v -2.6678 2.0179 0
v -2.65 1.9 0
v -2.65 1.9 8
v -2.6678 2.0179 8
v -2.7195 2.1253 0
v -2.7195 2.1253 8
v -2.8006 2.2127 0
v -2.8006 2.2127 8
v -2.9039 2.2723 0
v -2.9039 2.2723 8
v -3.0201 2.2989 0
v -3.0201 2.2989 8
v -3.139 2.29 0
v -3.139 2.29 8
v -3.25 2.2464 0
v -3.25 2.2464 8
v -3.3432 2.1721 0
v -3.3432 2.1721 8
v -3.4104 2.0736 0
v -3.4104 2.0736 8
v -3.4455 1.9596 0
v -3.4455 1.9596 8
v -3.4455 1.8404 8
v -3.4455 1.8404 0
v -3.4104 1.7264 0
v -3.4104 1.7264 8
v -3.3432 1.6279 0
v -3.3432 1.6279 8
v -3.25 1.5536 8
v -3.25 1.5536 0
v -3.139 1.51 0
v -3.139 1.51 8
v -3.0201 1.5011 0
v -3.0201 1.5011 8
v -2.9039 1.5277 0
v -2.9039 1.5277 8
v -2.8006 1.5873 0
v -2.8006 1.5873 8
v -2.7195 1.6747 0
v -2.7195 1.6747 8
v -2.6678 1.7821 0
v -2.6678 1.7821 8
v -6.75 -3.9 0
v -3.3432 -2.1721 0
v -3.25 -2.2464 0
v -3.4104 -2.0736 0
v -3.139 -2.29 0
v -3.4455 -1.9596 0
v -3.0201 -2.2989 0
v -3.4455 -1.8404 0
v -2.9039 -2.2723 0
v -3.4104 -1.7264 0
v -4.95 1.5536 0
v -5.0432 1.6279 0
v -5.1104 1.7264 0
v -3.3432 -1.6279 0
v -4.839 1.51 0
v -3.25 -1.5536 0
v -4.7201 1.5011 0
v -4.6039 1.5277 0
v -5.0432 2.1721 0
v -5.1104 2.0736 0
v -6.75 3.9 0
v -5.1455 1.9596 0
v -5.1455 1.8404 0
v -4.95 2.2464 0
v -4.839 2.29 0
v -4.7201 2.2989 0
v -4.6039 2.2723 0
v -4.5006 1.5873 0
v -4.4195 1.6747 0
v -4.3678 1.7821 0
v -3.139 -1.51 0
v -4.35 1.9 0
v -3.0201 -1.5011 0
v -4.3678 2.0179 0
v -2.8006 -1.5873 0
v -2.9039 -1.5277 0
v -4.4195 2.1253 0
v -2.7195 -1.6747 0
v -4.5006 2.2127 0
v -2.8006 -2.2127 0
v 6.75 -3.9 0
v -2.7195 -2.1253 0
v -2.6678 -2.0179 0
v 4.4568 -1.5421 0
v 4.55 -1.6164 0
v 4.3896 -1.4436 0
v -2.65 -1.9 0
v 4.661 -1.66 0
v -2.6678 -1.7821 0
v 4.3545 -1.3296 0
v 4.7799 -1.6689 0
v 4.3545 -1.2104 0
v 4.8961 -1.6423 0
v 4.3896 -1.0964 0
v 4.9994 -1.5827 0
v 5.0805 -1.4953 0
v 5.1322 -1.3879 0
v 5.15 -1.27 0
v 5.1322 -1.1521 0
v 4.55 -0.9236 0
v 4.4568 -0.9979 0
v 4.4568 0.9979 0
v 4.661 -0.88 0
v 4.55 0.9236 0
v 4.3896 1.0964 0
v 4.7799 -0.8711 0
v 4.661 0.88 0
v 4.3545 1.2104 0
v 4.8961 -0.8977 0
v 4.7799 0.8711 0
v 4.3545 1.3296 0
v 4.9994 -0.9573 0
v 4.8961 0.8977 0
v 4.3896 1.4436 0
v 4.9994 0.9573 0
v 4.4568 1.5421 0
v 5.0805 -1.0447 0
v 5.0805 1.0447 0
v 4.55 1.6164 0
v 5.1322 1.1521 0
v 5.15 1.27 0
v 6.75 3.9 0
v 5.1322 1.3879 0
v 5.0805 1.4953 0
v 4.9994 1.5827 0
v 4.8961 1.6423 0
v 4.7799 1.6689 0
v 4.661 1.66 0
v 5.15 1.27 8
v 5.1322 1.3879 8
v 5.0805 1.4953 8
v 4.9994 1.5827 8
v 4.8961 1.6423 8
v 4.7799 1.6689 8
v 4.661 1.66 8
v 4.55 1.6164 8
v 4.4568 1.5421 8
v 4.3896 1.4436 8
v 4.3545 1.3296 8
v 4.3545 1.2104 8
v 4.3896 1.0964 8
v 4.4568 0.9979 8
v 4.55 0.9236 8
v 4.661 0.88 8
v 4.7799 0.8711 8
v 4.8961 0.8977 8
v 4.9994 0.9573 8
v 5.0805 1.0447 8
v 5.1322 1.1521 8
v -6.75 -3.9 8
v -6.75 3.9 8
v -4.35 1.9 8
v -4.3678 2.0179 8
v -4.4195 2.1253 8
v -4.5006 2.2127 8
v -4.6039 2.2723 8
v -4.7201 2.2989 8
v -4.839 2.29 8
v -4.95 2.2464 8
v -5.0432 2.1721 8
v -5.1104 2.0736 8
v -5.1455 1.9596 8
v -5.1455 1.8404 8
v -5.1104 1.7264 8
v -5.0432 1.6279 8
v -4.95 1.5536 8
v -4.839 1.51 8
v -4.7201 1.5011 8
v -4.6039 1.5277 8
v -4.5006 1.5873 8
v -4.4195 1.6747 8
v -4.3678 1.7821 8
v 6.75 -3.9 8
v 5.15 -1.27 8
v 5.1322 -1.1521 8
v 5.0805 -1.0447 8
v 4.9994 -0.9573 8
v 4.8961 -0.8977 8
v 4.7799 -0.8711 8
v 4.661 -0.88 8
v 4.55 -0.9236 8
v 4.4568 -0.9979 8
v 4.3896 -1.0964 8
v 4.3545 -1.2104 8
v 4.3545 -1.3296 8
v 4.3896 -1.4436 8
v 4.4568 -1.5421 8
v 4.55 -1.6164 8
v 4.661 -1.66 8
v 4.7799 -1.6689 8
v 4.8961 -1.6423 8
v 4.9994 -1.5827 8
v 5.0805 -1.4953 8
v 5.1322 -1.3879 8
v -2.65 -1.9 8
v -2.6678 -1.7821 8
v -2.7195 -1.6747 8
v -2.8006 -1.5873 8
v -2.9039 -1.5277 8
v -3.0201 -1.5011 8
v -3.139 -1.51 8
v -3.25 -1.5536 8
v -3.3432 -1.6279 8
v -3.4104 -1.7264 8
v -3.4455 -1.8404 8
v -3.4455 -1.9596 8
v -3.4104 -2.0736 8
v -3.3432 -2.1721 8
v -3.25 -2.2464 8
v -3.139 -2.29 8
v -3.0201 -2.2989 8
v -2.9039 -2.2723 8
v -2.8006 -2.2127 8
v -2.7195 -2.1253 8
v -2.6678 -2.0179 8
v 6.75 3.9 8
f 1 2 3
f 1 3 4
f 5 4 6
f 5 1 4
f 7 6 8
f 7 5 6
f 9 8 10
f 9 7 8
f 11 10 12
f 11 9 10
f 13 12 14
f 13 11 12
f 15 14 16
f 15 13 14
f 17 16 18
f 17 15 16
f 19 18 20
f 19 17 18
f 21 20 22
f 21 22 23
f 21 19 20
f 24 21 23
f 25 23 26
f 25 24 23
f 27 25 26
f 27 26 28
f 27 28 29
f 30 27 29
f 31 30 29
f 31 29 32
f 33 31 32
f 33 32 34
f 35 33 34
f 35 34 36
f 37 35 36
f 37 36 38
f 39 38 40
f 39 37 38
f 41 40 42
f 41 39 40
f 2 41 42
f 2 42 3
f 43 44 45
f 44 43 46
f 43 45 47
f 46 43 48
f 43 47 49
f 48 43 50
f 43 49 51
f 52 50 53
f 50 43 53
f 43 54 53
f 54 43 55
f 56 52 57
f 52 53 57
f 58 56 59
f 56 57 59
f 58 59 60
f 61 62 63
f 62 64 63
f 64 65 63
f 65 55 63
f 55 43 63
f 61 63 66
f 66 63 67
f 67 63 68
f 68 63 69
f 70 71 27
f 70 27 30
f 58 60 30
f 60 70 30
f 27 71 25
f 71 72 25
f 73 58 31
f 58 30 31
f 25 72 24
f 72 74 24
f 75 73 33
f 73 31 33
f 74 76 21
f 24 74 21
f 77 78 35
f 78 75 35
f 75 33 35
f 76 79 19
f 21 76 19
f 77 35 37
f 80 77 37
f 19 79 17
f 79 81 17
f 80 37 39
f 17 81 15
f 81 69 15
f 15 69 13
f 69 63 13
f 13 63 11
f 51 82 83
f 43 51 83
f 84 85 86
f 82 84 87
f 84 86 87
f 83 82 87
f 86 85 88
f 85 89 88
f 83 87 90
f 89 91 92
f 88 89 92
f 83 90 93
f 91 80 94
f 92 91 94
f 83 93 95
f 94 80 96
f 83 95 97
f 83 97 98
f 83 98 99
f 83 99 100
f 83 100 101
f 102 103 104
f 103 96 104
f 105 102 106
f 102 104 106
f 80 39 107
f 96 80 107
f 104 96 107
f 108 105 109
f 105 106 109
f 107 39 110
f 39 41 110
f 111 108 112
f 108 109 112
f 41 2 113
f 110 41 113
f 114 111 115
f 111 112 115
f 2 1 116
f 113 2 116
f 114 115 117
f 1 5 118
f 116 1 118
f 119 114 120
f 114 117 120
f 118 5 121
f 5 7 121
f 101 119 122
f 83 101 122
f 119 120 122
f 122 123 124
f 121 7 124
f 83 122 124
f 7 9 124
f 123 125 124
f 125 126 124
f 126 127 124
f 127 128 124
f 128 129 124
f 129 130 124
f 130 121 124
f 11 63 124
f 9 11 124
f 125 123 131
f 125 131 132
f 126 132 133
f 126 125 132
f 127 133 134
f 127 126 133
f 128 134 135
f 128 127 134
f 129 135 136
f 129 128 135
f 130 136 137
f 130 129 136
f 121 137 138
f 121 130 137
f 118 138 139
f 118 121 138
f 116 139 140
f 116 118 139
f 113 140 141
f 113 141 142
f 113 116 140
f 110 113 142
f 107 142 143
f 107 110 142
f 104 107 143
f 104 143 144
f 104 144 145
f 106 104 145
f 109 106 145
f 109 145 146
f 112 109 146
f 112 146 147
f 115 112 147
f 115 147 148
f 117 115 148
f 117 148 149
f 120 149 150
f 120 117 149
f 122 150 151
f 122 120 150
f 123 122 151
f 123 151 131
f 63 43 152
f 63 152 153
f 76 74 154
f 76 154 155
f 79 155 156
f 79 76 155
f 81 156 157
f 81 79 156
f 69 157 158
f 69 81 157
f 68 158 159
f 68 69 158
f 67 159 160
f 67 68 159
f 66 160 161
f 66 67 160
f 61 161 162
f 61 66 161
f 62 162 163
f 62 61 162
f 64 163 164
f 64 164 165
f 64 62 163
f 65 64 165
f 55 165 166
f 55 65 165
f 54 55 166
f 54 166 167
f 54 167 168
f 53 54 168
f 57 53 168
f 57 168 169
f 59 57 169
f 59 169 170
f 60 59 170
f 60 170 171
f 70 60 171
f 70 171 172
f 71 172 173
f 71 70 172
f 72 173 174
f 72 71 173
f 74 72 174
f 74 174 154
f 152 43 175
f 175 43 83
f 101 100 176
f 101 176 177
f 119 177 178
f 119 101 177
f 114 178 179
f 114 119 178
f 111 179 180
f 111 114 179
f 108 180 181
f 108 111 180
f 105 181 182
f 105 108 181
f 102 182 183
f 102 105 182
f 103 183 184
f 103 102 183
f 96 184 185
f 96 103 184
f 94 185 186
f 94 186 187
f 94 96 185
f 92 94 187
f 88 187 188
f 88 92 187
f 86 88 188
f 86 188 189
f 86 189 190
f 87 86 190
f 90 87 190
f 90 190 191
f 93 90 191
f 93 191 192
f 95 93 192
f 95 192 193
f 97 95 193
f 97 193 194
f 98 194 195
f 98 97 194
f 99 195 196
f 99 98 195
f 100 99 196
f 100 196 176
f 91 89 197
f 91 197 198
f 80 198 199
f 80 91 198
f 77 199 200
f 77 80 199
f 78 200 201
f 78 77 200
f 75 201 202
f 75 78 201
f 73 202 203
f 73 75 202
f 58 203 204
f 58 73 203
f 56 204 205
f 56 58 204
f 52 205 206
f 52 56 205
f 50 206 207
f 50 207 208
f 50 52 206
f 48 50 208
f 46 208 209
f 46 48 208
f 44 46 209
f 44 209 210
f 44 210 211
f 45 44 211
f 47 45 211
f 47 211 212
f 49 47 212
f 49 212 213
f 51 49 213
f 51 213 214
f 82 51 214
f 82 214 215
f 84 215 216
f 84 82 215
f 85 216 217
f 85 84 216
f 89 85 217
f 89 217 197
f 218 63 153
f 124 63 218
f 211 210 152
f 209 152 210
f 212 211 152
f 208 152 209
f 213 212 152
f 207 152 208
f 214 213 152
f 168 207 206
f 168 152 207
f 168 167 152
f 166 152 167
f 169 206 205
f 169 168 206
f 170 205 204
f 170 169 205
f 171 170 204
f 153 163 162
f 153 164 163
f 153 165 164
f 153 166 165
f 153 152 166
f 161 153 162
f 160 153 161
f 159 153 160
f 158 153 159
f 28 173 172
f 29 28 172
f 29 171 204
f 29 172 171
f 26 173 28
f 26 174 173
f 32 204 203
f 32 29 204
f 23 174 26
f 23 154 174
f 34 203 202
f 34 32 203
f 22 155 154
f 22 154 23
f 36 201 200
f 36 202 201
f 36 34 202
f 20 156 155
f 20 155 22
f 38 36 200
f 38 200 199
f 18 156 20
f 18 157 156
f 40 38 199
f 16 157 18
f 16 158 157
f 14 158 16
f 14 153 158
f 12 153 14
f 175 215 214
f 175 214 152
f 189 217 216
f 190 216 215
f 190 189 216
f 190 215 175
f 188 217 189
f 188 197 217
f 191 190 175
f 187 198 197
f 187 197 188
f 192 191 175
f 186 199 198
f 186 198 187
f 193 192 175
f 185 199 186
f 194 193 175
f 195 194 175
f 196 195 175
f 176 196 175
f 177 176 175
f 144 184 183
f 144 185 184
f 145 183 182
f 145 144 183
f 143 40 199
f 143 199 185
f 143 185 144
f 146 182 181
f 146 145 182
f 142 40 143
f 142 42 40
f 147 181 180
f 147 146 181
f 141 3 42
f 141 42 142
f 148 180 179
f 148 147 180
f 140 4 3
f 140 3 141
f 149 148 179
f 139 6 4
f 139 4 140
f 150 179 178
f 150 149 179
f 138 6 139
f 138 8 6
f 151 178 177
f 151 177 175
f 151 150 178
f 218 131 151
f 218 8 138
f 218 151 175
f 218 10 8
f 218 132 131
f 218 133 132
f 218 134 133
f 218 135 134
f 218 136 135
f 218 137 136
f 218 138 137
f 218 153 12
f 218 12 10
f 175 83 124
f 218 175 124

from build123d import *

# Parameters (mm, degrees)
F0_W     = 13.5
F0_H     = 7.8
F0_R     = 0.4
F1_DEPTH = 8


with BuildPart() as f1:
    # F0 (on Top) → F1 (new body)
    with BuildSketch(Plane.XY):
        Rectangle(F0_W, F0_H)
        with Locations((-3.05, -1.9)):
            Circle(F0_R, mode=Mode.SUBTRACT)
        with Locations((4.75, -1.27)):
            Circle(F0_R, mode=Mode.SUBTRACT)
        with Locations((-4.75, 1.9)):
            Circle(F0_R, mode=Mode.SUBTRACT)
        with Locations((-3.05, 1.9)):
            Circle(F0_R, mode=Mode.SUBTRACT)
        with Locations((4.75, 1.27)):
            Circle(F0_R, mode=Mode.SUBTRACT)
    extrude(amount=F1_DEPTH)


solid = f1.part
